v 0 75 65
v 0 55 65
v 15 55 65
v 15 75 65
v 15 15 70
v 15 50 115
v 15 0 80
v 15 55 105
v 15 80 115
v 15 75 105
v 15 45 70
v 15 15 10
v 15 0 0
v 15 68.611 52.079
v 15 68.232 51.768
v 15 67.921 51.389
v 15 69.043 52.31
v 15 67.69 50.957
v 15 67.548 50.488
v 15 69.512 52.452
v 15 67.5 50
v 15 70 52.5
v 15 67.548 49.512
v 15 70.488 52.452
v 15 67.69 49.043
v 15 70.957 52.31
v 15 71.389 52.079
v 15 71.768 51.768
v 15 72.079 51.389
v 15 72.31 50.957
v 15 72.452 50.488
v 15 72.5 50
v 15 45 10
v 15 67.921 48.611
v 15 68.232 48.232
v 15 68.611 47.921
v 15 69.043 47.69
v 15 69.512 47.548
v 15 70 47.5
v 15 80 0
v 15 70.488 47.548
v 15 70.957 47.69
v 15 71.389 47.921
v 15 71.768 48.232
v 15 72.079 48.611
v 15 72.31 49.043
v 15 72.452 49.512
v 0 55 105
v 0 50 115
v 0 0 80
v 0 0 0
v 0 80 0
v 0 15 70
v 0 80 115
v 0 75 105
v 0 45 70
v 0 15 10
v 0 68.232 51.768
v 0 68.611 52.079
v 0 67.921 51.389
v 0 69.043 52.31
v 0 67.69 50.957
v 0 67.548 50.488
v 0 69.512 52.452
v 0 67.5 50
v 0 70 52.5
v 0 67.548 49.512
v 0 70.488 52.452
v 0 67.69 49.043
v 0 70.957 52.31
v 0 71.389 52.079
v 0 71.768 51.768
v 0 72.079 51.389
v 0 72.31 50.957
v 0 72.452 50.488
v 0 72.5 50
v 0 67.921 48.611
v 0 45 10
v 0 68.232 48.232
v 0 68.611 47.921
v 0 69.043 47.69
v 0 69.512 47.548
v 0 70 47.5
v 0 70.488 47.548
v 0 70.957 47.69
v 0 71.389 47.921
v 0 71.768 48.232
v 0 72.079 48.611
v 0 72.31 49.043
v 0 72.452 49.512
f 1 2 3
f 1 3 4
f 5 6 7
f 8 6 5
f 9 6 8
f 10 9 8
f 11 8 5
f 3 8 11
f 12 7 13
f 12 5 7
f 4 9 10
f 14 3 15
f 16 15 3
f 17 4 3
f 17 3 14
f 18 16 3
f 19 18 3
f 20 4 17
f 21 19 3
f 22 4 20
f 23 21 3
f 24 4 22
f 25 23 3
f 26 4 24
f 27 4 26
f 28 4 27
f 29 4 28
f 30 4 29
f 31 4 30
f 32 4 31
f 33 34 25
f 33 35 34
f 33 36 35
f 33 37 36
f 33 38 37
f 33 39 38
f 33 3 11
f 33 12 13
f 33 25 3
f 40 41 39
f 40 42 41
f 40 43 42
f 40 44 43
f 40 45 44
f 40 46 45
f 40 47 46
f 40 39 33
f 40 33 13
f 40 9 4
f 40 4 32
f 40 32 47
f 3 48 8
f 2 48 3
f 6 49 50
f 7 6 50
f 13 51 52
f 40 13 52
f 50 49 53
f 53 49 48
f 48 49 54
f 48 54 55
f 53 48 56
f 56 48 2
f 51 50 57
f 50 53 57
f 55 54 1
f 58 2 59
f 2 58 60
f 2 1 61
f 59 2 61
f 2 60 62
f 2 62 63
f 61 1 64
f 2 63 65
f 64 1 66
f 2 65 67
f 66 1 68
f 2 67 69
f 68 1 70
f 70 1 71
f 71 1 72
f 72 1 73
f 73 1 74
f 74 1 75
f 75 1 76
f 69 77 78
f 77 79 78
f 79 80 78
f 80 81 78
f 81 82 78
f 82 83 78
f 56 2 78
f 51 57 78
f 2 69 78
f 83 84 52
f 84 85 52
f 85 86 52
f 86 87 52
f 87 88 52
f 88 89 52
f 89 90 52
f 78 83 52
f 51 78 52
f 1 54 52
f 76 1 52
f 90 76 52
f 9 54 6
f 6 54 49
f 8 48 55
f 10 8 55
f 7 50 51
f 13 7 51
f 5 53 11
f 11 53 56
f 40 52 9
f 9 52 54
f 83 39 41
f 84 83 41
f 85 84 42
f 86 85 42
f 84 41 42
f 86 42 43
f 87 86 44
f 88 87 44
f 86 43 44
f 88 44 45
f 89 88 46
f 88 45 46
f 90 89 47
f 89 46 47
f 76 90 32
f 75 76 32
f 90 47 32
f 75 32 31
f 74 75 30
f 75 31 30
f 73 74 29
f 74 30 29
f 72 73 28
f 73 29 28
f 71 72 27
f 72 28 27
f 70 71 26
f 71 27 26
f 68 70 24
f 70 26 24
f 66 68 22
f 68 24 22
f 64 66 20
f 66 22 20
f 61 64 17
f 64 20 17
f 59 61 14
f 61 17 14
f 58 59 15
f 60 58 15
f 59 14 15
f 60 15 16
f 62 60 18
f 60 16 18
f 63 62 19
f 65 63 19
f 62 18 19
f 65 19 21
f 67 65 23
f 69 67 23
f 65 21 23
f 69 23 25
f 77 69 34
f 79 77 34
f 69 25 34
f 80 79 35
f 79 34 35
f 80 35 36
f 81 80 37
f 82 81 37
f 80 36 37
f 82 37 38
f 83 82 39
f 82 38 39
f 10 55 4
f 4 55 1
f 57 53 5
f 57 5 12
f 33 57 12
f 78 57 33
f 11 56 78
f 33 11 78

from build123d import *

# Parameters (mm, degrees)
SKETCH1_W           = 40
SKETCH1_H           = 20
SKETCH1_W_2         = 60
SKETCH1_H_2         = 30
BOSS_EXTRUDE1_DEPTH = 15
SKETCH2_R           = 2.5
CUT_EXTRUDE1_DEPTH  = 15


with BuildPart() as part:
    # Sketch1 → Boss-Extrude1 (new body)
    with BuildSketch(Plane(origin=(0, 0, 0), x_dir=(0, 0, -1), z_dir=(1, 0, 0))):
        Polygon((-115, 50), (-80, 0), (0, 0), (0, 80), (-115, 80), align=None)
        with Locations((-85, 65)):
            Rectangle(SKETCH1_W, SKETCH1_H, mode=Mode.SUBTRACT)
        with Locations((-40, 30)):
            Rectangle(SKETCH1_W_2, SKETCH1_H_2, mode=Mode.SUBTRACT)
    extrude(amount=BOSS_EXTRUDE1_DEPTH)

    # Sketch2 → Cut-Extrude1 (cut)
    with BuildSketch(Plane(origin=(15, 0, 0), x_dir=(0, 0, -1), z_dir=(1, 0, 0))):
        with Locations((-50, 70)):
            Circle(SKETCH2_R)
    extrude(amount=-CUT_EXTRUDE1_DEPTH, mode=Mode.SUBTRACT)


solid = part.part
